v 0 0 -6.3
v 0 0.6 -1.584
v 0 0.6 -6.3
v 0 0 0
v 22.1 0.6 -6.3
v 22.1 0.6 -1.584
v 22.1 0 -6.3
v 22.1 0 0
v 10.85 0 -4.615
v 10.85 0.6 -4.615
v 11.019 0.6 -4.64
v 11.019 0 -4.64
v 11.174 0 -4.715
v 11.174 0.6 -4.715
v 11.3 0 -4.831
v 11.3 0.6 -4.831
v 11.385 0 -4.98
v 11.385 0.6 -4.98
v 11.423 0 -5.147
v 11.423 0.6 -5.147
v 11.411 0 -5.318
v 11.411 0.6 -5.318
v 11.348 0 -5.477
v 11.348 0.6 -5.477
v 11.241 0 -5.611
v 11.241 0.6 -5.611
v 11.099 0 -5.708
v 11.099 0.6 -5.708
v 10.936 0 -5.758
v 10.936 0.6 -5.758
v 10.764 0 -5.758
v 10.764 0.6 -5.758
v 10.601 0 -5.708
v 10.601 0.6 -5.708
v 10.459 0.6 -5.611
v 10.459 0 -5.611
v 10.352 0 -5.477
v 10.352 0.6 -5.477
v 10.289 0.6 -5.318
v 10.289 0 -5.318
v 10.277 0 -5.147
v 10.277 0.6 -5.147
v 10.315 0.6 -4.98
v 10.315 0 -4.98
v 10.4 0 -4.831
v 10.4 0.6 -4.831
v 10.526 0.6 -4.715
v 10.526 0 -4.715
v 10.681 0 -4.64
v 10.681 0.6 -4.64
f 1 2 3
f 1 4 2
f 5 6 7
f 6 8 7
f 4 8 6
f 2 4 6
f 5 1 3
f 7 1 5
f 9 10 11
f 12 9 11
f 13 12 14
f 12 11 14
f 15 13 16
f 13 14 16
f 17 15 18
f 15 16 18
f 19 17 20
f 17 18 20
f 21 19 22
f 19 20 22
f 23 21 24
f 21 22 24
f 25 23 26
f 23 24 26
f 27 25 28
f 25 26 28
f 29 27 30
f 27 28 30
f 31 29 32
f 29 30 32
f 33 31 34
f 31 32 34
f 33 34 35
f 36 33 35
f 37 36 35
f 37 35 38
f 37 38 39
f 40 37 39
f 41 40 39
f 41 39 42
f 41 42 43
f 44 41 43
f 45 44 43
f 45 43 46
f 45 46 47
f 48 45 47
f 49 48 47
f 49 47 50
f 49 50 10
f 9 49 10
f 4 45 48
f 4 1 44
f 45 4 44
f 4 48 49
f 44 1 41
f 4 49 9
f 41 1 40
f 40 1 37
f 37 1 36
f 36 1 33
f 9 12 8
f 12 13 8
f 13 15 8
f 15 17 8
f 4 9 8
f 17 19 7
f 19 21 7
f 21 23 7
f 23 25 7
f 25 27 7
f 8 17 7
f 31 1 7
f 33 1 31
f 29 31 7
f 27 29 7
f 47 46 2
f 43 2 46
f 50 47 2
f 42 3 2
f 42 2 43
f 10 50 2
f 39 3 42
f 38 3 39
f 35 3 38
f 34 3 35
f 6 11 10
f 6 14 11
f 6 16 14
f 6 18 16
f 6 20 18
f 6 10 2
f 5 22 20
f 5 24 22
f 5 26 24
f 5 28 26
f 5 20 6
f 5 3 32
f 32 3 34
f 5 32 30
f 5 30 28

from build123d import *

# Parameters (mm, degrees)
SKETCH1_W           = 22.1
SKETCH1_H           = 6.3
BOSS_EXTRUDE1_DEPTH = 0.6
CUT_EXTRUDE1_DEPTH  = 24.73
SKETCH4_R           = 0.575
CUT_EXTRUDE2_DEPTH  = 2.54


with BuildPart() as part:
    # Sketch1 → Boss-Extrude1 (new body)
    with BuildSketch(Plane(origin=(0, 0, 0), x_dir=(1, 0, 0), z_dir=(0, 1, 0))):
        with Locations((11.05, 3.15)):
            Rectangle(SKETCH1_W, SKETCH1_H)
    extrude(amount=BOSS_EXTRUDE1_DEPTH)

    # Sketch3 → Cut-Extrude1 (cut)
    with BuildSketch(Plane(origin=(22.1, 0, 0), x_dir=(0, 0, -1), z_dir=(1, 0, 0))):
        Polygon((0, 0.6), (0, 0), (1.584478717, 0.6), align=None)
    extrude(amount=-CUT_EXTRUDE1_DEPTH, mode=Mode.SUBTRACT)

    # Sketch4 → Cut-Extrude2 (cut)
    with BuildSketch(Plane(origin=(0, 0.6, 0), x_dir=(1, 0, 0), z_dir=(0, 1, 0))):
        with Locations(Location((10.85, 5.189909292, 0), (0, 0, 270))):
            Circle(SKETCH4_R)
    extrude(amount=-CUT_EXTRUDE2_DEPTH, mode=Mode.SUBTRACT)


solid = part.part
